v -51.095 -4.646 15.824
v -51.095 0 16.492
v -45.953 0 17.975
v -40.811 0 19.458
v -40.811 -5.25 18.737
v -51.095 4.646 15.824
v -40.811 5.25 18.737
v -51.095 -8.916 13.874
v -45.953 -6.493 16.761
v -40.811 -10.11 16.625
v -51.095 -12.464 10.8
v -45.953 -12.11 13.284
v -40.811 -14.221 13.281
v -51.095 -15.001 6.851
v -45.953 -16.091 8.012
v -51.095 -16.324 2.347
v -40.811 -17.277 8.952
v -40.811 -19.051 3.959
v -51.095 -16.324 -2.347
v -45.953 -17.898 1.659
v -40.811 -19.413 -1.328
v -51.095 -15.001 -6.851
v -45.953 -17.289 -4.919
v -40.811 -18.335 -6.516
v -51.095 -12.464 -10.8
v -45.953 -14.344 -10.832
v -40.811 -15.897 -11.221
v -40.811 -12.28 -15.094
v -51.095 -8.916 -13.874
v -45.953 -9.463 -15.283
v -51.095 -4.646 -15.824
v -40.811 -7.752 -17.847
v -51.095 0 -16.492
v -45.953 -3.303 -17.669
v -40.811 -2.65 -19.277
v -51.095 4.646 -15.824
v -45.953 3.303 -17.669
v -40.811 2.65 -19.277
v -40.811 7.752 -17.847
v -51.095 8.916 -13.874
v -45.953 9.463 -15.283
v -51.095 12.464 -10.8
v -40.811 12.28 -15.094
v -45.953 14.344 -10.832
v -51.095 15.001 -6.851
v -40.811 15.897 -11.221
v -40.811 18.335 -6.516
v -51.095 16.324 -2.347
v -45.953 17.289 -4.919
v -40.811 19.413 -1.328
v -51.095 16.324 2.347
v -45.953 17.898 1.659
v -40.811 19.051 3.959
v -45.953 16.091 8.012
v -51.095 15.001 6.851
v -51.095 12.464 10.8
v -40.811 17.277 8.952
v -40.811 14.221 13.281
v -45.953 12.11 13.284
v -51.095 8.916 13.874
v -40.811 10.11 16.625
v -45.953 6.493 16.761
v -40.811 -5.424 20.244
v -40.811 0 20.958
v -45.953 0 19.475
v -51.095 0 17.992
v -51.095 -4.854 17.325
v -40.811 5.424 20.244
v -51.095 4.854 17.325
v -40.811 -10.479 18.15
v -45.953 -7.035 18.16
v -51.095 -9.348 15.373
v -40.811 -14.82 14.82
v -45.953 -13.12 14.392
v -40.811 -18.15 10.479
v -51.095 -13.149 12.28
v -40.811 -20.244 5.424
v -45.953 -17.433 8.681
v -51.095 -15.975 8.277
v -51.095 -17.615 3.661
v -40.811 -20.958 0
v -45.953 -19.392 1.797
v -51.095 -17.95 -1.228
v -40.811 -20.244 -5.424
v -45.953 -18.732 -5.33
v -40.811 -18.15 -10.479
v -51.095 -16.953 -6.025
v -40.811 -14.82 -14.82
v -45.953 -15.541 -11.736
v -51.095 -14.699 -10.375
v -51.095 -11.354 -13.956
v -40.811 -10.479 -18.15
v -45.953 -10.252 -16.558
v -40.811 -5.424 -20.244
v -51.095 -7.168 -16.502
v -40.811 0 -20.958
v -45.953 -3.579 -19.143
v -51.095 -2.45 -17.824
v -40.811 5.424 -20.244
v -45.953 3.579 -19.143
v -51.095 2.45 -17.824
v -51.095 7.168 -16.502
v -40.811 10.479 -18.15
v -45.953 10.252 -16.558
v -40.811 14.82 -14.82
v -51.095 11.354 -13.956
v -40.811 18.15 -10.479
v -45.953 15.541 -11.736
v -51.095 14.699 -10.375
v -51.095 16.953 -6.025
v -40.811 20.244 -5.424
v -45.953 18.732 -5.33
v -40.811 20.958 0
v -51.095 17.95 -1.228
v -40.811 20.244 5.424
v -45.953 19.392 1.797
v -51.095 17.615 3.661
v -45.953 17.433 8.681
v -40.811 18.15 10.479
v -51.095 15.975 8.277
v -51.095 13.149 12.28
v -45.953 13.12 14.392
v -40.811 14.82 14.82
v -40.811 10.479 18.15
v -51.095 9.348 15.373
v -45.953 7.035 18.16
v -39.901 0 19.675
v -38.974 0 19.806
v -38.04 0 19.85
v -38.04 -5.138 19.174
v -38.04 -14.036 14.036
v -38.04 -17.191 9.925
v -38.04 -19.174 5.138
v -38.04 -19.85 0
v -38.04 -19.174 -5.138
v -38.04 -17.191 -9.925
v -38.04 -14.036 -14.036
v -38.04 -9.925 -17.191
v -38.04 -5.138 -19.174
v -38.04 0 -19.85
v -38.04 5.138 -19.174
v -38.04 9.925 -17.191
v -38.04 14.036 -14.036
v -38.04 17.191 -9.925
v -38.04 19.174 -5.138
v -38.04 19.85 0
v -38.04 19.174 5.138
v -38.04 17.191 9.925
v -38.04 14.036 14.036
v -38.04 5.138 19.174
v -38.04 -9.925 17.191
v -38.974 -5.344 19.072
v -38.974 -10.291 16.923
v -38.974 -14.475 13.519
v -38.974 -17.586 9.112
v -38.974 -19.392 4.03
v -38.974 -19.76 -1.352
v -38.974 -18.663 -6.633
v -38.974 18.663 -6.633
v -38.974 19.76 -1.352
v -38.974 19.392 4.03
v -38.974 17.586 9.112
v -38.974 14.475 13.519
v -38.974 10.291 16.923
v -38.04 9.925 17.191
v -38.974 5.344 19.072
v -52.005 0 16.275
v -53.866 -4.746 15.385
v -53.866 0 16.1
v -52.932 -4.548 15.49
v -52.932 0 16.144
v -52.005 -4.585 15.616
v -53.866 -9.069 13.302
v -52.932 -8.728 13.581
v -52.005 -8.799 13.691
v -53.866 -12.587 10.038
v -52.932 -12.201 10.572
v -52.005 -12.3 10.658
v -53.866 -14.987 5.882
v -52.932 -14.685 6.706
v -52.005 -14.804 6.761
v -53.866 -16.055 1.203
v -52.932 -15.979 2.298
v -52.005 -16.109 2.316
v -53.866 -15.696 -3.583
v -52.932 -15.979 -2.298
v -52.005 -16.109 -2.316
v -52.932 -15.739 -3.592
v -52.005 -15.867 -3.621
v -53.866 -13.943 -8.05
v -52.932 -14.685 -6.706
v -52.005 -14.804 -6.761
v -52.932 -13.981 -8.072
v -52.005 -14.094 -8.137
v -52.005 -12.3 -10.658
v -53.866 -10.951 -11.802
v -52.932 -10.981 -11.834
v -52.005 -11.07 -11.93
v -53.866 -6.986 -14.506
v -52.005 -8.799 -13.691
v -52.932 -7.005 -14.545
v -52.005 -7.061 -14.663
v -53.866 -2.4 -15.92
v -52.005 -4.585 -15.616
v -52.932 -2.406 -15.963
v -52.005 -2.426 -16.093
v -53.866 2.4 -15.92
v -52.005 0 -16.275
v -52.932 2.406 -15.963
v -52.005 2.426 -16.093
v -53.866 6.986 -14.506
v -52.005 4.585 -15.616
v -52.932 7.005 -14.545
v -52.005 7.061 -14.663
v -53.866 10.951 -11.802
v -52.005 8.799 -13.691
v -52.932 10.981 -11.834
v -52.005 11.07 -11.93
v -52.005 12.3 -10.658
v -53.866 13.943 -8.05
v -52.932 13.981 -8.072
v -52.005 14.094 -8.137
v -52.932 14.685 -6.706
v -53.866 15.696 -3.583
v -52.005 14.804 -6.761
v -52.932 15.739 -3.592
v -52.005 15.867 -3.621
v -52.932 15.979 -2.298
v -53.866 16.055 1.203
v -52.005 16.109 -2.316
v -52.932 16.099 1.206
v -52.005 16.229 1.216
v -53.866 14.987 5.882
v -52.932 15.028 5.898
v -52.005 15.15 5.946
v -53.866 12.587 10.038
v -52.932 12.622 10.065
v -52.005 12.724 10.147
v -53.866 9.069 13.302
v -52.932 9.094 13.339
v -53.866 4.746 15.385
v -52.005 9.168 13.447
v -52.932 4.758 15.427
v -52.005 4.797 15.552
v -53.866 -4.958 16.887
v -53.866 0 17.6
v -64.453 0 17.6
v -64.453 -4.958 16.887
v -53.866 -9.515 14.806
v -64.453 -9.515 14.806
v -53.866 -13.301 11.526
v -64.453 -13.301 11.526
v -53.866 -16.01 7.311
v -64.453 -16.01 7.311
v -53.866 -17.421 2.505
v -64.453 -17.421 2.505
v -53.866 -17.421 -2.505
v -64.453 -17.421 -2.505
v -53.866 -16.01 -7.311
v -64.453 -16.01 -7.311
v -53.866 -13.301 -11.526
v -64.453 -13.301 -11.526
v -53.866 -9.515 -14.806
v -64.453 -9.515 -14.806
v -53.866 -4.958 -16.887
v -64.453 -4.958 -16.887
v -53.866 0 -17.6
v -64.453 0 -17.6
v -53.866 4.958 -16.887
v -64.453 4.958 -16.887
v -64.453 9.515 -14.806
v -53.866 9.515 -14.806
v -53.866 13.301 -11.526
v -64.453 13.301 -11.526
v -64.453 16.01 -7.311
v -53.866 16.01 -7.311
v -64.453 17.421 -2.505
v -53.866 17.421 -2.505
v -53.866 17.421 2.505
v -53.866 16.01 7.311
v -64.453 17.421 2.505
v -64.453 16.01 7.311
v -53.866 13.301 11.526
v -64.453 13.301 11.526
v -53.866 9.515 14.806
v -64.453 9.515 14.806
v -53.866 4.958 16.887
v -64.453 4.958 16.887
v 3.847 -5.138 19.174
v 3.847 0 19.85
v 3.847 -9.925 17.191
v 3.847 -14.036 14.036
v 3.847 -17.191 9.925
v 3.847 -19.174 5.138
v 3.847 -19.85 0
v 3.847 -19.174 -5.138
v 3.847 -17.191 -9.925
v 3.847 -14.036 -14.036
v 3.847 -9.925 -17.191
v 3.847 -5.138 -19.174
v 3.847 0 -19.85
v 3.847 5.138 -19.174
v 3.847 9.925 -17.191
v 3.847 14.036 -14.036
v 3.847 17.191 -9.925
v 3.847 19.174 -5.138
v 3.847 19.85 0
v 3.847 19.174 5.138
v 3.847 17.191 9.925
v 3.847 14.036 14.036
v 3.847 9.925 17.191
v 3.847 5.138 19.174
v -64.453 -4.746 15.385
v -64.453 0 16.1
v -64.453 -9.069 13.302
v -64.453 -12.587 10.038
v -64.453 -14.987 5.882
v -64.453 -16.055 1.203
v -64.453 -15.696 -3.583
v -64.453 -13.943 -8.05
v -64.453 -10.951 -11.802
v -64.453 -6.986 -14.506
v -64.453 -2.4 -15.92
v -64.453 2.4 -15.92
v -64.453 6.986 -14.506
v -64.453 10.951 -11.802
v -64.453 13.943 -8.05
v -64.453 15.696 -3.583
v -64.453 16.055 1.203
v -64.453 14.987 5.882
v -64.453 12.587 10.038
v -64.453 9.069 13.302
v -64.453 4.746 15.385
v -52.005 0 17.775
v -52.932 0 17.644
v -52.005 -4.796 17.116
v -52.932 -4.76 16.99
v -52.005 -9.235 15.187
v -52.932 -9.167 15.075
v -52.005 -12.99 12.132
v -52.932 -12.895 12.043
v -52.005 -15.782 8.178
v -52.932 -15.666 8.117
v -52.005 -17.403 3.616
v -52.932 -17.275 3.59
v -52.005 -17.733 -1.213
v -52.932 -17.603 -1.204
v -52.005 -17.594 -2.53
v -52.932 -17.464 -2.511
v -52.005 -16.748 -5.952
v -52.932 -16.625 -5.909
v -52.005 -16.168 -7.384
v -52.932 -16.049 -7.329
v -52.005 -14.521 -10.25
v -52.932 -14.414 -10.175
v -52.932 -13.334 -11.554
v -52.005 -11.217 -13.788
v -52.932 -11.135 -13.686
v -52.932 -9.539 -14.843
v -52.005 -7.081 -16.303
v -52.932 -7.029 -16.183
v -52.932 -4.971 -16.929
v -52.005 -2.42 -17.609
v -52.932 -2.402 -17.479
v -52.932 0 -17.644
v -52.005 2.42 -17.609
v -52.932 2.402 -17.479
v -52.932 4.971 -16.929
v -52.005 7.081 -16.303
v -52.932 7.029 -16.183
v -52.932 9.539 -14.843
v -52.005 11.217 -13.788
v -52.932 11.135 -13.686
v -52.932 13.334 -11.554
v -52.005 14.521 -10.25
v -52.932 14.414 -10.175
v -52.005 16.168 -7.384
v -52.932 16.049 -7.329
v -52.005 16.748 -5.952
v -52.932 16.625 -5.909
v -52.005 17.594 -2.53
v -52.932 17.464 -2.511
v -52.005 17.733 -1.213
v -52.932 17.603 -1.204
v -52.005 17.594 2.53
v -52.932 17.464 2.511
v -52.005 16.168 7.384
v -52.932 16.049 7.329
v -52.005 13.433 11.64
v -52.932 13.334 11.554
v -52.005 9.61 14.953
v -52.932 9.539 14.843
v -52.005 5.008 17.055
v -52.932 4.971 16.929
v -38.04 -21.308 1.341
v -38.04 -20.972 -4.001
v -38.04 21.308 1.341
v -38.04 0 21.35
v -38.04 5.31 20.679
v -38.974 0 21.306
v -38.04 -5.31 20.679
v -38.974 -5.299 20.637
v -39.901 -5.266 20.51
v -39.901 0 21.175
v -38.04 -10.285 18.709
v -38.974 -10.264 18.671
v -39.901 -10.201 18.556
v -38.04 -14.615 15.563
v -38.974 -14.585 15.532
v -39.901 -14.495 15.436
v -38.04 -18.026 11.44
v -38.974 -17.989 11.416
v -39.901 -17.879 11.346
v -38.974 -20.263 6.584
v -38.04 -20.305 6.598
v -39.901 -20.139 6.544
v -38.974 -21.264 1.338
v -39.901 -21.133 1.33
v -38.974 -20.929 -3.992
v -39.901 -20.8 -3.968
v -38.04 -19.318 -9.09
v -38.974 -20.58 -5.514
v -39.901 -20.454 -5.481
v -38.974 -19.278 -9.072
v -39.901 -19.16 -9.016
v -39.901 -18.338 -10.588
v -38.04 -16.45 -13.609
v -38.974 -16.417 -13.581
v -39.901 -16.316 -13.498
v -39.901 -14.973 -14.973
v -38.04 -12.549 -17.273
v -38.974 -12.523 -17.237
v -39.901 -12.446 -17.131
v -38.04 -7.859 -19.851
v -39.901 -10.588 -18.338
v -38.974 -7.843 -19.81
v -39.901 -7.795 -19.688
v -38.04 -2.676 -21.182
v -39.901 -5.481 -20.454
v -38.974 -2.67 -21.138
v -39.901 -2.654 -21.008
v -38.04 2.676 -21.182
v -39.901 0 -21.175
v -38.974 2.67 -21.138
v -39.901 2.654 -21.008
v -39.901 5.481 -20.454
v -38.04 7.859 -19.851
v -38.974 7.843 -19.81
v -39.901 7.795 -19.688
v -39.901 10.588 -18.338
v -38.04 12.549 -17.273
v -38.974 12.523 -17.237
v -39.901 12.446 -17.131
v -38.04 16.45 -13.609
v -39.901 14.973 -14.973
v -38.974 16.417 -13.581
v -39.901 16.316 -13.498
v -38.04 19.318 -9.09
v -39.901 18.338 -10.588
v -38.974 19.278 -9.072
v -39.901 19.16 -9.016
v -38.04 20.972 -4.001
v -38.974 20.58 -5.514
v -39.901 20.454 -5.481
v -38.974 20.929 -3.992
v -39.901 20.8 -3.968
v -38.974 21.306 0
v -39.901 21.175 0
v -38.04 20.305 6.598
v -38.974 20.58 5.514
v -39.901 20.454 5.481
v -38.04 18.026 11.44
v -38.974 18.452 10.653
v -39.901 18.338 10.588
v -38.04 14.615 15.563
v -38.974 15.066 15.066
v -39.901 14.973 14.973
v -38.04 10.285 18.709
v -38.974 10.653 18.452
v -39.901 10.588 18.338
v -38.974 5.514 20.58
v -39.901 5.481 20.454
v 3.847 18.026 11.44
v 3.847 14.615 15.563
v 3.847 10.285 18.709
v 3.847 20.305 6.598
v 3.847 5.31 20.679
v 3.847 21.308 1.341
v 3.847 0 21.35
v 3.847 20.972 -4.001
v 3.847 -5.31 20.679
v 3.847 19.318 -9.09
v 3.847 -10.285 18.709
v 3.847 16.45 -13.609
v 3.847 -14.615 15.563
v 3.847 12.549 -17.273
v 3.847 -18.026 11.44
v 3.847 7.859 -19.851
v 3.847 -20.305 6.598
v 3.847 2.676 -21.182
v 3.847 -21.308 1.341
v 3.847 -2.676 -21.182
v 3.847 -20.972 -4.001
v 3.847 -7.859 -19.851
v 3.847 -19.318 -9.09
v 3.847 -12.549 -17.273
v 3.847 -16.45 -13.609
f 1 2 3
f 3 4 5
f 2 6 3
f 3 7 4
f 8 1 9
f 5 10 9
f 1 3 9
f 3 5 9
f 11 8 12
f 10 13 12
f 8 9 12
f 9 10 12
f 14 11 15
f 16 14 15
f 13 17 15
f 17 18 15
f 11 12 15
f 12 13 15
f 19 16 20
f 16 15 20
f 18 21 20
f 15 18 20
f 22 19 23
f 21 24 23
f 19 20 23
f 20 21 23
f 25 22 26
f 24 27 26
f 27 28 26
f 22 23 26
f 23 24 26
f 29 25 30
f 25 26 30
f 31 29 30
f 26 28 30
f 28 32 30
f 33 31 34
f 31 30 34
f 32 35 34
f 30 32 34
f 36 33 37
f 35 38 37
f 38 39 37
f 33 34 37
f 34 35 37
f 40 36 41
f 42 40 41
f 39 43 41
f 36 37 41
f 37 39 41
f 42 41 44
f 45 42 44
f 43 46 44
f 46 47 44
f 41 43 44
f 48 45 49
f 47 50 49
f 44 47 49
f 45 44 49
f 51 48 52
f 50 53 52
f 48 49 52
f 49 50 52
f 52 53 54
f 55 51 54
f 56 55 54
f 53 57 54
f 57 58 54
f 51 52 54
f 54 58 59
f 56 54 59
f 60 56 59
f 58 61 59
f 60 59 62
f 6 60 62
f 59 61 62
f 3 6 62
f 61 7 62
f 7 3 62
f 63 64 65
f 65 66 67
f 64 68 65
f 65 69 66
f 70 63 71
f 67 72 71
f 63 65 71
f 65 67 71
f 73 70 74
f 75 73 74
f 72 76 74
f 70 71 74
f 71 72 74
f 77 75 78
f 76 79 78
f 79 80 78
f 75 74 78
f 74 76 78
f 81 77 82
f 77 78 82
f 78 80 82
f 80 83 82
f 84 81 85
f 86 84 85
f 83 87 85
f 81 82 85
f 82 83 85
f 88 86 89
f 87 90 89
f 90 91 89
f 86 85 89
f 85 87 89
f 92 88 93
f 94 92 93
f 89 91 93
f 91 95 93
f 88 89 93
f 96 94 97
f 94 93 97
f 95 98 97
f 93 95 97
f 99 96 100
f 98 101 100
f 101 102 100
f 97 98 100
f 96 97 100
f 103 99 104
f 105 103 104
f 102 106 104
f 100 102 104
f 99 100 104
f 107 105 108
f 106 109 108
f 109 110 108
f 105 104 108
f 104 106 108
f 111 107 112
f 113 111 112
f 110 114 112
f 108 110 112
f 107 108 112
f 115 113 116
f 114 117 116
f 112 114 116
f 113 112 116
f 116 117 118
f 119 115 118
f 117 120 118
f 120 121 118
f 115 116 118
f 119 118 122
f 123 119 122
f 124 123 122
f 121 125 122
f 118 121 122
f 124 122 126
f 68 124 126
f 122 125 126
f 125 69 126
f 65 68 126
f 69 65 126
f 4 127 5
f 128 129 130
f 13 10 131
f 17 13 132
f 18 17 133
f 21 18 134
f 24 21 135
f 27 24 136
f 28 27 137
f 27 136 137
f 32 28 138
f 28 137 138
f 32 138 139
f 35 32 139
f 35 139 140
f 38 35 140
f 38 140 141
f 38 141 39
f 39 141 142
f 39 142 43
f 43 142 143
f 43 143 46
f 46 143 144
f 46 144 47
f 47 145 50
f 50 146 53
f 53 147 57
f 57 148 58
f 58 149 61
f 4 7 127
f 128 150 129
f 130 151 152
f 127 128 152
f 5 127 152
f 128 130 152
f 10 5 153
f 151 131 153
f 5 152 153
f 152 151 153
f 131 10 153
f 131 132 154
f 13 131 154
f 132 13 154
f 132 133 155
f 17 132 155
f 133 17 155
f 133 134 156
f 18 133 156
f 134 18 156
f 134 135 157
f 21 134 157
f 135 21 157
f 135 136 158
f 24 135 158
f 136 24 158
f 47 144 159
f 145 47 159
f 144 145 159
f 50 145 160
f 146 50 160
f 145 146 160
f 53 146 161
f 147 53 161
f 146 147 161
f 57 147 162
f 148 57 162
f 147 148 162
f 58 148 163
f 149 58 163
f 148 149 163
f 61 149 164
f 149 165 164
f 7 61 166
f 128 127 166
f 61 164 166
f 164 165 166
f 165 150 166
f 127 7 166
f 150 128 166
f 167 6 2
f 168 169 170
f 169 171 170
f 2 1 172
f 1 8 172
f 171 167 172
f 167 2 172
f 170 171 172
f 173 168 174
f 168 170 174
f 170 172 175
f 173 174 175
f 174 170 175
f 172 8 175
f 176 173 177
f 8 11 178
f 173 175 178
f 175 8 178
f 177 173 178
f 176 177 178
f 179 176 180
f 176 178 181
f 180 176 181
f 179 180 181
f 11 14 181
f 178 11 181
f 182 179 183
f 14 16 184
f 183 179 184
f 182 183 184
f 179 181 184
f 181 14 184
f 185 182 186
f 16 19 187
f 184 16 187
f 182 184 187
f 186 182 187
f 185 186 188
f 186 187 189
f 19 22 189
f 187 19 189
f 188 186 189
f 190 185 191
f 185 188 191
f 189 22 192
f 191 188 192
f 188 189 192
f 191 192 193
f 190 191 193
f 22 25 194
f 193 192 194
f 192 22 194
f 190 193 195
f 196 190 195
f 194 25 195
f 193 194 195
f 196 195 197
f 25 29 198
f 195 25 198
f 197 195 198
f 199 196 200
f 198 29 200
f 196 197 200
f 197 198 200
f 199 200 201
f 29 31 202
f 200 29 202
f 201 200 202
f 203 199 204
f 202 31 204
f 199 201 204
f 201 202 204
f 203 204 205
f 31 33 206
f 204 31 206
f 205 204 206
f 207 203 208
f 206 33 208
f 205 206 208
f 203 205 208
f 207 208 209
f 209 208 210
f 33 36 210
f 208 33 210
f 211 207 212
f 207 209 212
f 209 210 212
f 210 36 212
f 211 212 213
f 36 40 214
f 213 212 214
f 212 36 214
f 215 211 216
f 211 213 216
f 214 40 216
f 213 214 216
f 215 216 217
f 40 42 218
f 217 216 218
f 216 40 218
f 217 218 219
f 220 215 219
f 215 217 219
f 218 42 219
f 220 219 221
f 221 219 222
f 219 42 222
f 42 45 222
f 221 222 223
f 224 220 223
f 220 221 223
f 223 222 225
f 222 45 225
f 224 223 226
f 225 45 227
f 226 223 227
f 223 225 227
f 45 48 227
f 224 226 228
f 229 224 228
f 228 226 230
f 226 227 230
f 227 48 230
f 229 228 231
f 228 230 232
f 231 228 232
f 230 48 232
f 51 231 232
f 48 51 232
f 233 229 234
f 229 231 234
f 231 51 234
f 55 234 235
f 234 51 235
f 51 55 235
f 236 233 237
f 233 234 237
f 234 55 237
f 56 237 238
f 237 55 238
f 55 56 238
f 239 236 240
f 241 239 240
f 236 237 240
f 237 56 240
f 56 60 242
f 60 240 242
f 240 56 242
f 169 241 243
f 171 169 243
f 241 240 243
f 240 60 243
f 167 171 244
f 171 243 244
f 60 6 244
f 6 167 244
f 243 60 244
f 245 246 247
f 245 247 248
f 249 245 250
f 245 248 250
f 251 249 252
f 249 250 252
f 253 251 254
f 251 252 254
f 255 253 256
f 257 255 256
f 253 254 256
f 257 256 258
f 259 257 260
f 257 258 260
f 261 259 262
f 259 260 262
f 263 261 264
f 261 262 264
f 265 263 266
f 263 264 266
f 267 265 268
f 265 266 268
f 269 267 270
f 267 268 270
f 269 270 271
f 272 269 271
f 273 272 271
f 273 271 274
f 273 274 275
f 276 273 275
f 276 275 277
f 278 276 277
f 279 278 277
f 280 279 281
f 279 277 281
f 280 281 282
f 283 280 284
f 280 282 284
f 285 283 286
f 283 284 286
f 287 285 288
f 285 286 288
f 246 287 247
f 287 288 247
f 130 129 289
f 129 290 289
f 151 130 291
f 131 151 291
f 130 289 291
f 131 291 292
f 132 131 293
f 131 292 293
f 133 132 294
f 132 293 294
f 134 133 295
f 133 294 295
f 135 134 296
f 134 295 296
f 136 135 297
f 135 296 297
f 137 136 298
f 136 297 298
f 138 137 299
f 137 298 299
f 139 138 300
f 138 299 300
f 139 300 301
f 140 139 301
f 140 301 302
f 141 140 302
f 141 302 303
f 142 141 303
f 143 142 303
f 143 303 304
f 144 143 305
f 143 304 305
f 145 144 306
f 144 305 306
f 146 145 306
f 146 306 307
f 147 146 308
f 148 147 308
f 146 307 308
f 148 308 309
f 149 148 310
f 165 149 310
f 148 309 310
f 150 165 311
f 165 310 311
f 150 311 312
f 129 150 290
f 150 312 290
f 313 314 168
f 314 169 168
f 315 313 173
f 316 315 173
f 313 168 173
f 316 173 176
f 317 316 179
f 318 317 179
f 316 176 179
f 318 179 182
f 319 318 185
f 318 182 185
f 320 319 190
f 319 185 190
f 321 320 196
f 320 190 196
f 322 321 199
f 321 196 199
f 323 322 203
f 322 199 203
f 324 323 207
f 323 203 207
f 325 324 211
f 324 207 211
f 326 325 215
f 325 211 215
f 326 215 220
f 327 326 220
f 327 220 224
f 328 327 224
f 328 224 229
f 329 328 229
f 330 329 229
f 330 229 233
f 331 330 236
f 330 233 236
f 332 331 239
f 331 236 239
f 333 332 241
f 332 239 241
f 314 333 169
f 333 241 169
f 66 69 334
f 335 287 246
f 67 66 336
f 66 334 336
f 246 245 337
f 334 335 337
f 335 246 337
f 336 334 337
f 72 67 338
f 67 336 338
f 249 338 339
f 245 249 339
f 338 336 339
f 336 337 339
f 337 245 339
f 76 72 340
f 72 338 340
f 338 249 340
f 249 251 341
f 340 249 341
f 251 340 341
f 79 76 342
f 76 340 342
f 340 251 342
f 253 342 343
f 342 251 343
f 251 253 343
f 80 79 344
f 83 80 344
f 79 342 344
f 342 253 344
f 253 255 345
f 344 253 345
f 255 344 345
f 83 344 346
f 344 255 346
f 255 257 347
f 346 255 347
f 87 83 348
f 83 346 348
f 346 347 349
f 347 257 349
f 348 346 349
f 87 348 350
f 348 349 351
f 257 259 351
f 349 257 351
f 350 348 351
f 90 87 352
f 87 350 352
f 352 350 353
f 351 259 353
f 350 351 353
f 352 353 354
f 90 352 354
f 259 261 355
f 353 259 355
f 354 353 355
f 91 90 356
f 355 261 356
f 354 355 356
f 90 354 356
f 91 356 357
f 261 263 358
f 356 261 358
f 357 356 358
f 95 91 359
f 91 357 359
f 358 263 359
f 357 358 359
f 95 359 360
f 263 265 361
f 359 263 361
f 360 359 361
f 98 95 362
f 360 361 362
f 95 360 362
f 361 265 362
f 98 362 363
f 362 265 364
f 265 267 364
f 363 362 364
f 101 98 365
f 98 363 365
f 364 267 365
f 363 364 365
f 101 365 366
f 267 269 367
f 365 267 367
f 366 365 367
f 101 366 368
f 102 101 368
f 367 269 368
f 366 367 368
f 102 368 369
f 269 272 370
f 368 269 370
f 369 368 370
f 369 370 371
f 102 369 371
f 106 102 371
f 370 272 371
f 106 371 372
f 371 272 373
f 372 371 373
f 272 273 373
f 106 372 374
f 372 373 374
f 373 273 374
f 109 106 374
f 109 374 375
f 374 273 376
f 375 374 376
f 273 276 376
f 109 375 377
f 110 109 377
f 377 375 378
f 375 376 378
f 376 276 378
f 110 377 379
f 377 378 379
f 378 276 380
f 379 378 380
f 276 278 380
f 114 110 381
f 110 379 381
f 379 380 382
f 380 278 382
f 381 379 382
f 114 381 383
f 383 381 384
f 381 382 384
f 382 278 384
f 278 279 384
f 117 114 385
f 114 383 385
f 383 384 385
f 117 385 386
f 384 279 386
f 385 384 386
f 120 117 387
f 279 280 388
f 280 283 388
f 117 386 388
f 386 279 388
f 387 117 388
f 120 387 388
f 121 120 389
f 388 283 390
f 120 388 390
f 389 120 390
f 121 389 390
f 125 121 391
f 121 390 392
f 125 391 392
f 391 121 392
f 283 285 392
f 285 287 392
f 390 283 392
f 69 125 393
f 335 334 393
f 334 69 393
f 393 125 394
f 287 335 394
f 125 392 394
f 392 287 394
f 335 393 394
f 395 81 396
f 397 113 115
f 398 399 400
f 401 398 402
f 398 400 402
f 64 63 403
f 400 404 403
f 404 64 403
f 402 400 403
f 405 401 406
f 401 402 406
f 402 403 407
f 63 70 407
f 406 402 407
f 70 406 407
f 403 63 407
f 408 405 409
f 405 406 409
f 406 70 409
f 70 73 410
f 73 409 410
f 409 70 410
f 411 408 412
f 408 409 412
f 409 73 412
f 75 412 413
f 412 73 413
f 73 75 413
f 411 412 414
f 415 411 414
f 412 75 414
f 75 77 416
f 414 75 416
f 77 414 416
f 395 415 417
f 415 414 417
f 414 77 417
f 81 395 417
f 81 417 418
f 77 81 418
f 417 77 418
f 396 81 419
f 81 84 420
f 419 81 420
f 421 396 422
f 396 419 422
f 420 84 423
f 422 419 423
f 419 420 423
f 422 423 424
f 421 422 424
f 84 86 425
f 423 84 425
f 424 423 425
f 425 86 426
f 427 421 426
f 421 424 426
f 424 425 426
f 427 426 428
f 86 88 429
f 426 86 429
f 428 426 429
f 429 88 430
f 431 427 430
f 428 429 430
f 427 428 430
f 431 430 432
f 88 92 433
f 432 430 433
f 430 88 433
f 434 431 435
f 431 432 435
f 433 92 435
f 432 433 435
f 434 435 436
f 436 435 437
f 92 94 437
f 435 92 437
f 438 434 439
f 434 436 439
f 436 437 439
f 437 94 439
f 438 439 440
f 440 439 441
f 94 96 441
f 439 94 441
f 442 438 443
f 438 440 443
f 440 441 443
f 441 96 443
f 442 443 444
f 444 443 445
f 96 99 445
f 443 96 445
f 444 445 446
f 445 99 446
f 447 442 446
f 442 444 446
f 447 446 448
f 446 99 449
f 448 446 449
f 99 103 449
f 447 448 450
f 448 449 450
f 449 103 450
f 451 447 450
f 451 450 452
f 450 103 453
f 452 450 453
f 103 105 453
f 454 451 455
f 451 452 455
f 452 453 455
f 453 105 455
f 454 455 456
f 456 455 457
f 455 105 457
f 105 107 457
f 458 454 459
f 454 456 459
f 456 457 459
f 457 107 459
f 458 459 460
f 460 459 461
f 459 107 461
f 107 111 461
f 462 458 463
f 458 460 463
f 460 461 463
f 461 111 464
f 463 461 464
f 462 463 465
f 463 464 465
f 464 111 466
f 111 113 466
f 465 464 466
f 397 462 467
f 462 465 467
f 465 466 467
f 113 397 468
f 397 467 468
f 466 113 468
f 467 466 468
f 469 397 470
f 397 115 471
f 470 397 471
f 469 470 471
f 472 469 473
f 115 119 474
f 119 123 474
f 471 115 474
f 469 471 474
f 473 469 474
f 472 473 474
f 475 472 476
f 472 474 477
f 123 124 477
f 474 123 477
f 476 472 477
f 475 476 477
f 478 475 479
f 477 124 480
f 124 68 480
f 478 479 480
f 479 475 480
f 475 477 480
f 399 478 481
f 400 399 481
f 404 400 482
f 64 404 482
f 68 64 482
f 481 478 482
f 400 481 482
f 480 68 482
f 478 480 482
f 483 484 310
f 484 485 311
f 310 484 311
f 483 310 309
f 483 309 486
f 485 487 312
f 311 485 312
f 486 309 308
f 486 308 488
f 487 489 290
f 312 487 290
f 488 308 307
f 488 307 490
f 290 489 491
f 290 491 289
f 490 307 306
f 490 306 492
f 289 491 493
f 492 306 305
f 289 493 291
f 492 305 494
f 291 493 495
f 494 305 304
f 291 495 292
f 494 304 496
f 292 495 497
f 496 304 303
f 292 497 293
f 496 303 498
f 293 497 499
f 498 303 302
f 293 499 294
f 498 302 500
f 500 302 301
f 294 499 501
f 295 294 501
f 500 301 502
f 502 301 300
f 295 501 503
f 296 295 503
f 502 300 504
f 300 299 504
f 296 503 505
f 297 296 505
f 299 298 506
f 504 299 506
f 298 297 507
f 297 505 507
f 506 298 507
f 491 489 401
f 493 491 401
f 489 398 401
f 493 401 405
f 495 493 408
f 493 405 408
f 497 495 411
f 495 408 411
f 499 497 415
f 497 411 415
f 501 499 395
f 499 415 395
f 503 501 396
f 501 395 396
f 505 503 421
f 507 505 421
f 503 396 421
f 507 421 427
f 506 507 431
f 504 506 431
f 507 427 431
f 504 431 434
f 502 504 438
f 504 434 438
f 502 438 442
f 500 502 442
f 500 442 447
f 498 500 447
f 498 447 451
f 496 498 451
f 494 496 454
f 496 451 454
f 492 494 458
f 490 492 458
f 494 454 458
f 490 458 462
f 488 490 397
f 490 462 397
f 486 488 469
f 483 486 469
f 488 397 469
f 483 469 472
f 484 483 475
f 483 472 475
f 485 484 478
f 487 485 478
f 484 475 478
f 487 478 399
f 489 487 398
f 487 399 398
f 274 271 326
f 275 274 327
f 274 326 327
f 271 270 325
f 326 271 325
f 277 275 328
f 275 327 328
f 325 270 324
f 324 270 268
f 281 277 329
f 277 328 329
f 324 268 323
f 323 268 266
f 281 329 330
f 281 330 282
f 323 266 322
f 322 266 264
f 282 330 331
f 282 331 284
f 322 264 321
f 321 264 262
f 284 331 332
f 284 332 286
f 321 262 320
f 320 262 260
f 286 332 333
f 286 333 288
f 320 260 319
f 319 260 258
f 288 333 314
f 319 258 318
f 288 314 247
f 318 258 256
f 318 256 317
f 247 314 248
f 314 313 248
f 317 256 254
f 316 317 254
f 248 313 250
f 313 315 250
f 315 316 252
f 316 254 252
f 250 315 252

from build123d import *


with BuildPart() as part:
    # Sketch1 → Revolve1 (revolve)
    with BuildSketch(Plane(origin=(0, 0, 0), x_dir=(1, 0, 0), z_dir=(0, 1, 0)), mode=Mode.PRIVATE) as revolve1_sk:
        with BuildLine():
            Line((-64.453003754, 16.1), (-53.866494762, 16.1))
            ThreePointArc((-53.866494762, 16.1), (-52.466916096, 16.1984254), (-51.094888249, 16.491764088))
            Line((-51.094888249, 16.491764088), (-40.81111926, 19.458235912))
            ThreePointArc((-40.81111926, 19.458235912), (-39.439091413, 19.7515746), (-38.039512747, 19.85))
            Line((-38.039512747, 19.85), (3.846996246, 19.85))
            Line((3.846996246, 19.85), (3.846996246, 21.35))
            Line((3.846996246, 21.35), (-38.039512747, 21.35))
            ThreePointArc((-38.039512747, 21.35), (-39.439091413, 21.2515746), (-40.81111926, 20.958235912))
            Line((-40.81111926, 20.958235912), (-51.094888249, 17.991764088))
            ThreePointArc((-51.094888249, 17.991764088), (-52.466916096, 17.6984254), (-53.866494762, 17.6))
            Line((-53.866494762, 17.6), (-64.453003754, 17.6))
            Line((-64.453003754, 17.6), (-64.453003754, 16.1))
        make_face()
    revolve(revolve1_sk.sketch.rotate(Axis((-73.729430683, 0, 0), (1, 0, 0)), 180), axis=Axis((-73.729430683, 0, 0), (1, 0, 0)))


solid = part.part
